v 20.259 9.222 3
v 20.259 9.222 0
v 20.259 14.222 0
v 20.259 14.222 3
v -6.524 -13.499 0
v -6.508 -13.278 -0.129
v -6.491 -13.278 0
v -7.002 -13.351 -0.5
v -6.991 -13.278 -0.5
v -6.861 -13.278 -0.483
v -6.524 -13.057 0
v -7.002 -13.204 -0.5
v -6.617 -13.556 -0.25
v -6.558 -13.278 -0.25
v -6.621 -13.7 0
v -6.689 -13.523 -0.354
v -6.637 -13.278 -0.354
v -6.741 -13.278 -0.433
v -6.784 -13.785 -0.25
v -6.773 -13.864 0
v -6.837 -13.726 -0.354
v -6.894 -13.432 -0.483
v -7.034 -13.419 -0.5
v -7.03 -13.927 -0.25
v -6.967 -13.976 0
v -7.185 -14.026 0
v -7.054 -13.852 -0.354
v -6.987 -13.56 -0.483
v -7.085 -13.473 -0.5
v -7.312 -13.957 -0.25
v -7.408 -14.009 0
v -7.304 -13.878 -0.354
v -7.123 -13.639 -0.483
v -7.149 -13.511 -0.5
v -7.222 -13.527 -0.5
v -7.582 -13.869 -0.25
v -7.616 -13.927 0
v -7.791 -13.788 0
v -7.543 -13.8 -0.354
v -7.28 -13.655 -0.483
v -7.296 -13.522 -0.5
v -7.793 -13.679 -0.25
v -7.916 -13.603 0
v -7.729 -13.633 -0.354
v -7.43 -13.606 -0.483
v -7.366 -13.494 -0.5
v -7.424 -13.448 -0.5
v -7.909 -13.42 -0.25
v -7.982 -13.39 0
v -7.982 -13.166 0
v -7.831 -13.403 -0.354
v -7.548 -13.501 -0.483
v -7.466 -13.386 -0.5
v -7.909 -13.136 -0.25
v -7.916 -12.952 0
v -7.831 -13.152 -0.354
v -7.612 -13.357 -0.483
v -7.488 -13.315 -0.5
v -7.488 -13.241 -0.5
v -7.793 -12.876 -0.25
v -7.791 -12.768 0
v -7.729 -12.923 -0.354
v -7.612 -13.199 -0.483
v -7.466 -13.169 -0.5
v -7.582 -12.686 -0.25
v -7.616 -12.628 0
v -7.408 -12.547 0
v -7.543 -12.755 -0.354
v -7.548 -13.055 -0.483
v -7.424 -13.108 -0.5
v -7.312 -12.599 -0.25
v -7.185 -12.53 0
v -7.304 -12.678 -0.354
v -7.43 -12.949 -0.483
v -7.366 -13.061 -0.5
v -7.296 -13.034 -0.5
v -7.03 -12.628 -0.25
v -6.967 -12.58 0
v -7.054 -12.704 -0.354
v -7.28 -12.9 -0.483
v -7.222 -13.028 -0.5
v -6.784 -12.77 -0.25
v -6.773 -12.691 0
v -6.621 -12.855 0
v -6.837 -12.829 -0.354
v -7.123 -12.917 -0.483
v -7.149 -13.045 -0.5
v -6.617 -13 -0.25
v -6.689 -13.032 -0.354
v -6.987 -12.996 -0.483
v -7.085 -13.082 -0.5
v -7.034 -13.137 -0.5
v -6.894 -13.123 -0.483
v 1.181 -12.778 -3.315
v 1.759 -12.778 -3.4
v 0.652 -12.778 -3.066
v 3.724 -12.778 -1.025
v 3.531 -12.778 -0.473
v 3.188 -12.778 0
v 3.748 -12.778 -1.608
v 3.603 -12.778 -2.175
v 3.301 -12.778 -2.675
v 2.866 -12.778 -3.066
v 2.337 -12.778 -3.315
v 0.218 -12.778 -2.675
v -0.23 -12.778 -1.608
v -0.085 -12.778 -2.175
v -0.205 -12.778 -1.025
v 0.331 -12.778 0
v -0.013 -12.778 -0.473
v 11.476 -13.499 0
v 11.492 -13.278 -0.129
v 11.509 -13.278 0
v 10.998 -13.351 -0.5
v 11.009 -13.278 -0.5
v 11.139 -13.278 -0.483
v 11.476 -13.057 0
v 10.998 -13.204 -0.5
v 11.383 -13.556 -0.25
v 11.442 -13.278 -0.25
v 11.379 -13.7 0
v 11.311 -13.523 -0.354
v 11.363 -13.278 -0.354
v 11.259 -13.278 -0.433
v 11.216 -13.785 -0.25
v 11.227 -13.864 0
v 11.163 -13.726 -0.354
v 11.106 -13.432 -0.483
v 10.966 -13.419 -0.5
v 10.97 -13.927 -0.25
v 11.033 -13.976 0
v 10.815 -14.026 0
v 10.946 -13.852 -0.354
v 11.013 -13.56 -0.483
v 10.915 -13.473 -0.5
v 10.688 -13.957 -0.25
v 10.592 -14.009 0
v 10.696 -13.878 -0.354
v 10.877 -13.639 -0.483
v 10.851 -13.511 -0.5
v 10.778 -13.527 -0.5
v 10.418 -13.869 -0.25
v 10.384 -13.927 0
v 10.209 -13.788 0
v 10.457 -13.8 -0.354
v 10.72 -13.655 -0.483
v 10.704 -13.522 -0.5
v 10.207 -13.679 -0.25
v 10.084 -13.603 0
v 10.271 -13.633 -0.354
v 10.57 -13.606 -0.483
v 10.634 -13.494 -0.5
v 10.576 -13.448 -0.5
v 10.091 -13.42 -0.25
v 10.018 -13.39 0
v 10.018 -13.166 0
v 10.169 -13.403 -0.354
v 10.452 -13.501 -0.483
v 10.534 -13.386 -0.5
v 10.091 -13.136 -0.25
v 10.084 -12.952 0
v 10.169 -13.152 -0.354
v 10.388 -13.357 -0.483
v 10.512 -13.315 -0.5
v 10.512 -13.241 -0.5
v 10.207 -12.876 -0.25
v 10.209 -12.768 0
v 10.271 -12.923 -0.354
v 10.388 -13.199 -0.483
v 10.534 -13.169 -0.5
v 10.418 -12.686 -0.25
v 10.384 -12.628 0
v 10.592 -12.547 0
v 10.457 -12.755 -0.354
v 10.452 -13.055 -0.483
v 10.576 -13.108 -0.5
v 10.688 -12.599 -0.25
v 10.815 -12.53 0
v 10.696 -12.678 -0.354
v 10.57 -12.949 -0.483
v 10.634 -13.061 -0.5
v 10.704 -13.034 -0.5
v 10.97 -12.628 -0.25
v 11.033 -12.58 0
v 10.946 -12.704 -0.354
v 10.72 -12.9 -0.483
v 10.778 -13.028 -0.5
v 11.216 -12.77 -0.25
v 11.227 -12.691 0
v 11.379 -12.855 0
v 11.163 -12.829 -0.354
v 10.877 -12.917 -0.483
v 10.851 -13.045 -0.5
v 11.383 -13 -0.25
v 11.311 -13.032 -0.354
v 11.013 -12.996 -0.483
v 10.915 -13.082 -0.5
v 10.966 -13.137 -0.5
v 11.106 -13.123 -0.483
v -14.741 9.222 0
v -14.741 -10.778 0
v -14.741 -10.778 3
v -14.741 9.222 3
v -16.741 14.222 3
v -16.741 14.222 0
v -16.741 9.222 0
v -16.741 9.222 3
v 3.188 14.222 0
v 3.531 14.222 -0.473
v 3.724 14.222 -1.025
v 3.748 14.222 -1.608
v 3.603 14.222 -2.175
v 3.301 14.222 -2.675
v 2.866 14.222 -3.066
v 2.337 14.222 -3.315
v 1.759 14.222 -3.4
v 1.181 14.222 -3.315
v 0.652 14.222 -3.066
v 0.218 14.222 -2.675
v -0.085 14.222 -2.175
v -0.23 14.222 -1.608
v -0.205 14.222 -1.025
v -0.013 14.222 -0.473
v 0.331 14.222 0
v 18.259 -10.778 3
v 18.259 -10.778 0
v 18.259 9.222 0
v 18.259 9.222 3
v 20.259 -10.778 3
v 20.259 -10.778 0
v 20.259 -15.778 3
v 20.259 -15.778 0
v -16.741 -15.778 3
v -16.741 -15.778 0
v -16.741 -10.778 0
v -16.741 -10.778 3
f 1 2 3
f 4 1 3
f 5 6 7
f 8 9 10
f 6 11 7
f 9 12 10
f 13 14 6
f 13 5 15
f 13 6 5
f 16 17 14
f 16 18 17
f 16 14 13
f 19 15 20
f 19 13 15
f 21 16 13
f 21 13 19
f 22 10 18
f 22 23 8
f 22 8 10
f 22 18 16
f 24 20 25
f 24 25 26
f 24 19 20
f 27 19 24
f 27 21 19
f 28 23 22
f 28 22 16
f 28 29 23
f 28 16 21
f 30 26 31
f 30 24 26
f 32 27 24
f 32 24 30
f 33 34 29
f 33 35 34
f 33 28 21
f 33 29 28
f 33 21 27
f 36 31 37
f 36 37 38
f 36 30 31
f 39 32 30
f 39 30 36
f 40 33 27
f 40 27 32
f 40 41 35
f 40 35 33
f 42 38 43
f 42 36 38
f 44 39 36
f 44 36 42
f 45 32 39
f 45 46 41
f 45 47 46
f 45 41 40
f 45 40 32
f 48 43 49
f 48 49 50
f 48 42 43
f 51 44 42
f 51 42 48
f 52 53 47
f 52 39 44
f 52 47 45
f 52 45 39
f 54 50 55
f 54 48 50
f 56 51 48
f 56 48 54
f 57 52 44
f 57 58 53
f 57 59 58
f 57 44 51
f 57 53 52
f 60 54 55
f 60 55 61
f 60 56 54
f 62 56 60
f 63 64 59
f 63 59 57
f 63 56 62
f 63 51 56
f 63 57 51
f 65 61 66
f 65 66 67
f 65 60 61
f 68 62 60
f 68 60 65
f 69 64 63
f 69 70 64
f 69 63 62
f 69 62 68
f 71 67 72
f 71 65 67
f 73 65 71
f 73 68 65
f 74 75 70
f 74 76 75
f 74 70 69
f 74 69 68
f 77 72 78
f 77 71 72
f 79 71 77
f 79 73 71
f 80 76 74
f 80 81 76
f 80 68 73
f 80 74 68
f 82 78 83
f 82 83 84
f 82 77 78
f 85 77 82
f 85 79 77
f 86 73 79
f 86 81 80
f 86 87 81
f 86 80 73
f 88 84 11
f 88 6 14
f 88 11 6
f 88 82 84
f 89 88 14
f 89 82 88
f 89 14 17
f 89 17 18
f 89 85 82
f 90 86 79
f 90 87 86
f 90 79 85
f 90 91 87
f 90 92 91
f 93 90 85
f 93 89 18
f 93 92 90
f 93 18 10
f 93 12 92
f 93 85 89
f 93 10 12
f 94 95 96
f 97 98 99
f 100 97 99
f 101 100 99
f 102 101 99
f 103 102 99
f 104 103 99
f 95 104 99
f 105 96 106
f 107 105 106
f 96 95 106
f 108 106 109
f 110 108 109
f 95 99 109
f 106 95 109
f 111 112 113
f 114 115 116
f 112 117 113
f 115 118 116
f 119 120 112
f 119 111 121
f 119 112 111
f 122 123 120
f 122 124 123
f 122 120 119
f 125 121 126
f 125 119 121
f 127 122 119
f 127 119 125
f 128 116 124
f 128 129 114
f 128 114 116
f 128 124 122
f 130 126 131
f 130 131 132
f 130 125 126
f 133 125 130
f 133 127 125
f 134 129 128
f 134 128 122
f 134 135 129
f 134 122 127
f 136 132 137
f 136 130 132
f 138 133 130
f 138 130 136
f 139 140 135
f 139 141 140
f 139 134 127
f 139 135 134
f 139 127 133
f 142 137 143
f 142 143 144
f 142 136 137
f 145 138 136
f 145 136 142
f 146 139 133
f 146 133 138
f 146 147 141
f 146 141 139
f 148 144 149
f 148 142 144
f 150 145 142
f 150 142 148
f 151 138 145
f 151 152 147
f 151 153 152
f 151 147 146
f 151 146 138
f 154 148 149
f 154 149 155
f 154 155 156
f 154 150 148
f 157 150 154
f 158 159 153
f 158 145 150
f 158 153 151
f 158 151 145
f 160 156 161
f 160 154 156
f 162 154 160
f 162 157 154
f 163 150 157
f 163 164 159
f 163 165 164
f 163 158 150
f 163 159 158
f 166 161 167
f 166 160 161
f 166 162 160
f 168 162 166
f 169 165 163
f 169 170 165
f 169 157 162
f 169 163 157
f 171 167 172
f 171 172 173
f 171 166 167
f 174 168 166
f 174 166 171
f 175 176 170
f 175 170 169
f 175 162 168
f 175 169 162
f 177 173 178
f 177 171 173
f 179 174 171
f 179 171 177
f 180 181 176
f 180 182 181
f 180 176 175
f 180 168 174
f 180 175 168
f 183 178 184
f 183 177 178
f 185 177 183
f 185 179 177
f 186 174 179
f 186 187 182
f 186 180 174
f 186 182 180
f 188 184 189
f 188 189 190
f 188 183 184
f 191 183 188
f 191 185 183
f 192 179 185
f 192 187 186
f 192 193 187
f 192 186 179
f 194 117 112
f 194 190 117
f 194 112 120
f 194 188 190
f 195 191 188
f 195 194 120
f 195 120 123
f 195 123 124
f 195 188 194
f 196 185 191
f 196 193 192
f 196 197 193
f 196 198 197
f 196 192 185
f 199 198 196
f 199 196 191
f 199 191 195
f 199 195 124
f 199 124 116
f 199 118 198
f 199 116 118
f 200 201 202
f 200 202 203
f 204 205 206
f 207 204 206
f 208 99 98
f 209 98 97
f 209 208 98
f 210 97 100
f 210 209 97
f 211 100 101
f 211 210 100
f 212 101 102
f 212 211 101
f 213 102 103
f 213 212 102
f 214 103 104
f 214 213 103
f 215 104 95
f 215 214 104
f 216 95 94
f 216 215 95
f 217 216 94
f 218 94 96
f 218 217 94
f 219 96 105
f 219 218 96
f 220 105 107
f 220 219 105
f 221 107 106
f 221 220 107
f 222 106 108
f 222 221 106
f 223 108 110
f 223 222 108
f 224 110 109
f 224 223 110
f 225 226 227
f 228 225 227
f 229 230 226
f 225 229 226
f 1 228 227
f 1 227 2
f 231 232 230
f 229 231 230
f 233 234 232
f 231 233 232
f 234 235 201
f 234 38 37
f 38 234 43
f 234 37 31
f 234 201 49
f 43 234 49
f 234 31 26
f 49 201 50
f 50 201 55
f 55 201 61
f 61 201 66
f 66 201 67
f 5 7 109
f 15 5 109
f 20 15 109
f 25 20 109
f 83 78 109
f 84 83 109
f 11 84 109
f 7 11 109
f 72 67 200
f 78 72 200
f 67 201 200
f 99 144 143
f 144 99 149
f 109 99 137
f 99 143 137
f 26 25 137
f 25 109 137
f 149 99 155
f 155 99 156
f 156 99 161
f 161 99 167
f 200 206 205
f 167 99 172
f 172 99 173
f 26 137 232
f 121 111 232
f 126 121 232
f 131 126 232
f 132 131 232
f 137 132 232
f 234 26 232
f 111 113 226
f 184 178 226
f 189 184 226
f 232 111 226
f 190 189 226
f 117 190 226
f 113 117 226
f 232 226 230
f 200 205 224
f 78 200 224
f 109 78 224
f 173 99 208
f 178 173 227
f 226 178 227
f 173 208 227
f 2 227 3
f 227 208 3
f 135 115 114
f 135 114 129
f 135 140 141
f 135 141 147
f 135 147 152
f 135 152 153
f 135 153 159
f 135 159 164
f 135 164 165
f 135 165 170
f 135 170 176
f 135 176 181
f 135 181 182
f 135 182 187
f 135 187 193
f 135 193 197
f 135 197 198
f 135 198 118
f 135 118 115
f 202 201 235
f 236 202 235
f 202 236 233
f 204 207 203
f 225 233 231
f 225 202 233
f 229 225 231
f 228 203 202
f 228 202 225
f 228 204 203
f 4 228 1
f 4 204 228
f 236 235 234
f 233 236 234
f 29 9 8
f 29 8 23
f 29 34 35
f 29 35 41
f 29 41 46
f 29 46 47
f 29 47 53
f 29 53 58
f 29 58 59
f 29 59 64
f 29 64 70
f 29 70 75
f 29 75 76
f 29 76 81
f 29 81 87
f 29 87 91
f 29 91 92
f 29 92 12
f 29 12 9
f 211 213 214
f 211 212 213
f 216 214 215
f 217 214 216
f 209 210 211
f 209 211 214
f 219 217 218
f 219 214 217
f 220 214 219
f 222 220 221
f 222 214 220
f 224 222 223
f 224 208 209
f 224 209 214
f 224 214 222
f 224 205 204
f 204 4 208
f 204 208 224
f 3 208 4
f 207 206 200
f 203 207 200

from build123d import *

# Parameters (mm, degrees)
F0_W     = 2
F0_H     = 1.5
F0_H_2   = 20
F0_W_2   = 11
F0_W_3   = 7
F1_DEPTH = 3
F3_DEPTH = 26.5
F5_R     = 2
F6_DEPTH = 27
F7_R     = 0.75
F8_DEPTH = 0.5
F9_R     = 0.49999


# Not quite as in the source:
# - a fillet or chamfer is up to 0.001 mm smaller than in the source, because OpenCascade refuses the exact size


with BuildPart() as f1:
    # F0 (on Top) → F1 (new body)
    with BuildSketch(Plane.XY):
        Polygon((-1.7407407407, 9.2222222222), (5.2592592593, 9.2222222222), (16.2592592593, 9.2222222222), (16.2592592593, 10.7222222222), (18.2592592593, 10.7222222222), (18.2592592593, 9.2222222222), (20.2592592593, 9.2222222222), (20.2592592593, 14.2222222222), (-16.7407407407, 14.2222222222), (-16.7407407407, 9.2222222222), (-14.7407407407, 9.2222222222), (-14.7407407407, 10.7222222222), (-12.7407407407, 10.7222222222), (-12.7407407407, 9.2222222222), align=None)
        Polygon((16.2592592593, -10.7777777778), (5.2592592593, -10.7777777778), (-1.7407407407, -10.7777777778), (-12.7407407407, -10.7777777778), (-12.7407407407, -12.2777777778), (-14.7407407407, -12.2777777778), (-14.7407407407, -10.7777777778), (-16.7407407407, -10.7777777778), (-16.7407407407, -15.7777777778), (20.2592592593, -15.7777777778), (20.2592592593, -10.7777777778), (18.2592592593, -10.7777777778), (18.2592592593, -12.2777777778), (16.2592592593, -12.2777777778), align=None)
        with Locations((17.2592592593, 9.9722222222)):
            Rectangle(F0_W, F0_H)
        with Locations((17.2592592593, -0.7777777778)):
            Rectangle(F0_W, F0_H_2)
        with Locations((-13.7407407407, -0.7777777778)):
            Rectangle(F0_W, F0_H_2)
        with Locations((-13.7407407407, 9.9722222222)):
            Rectangle(F0_W, F0_H)
        with Locations((17.2592592593, -11.5277777778)):
            Rectangle(F0_W, F0_H)
        with Locations((-13.7407407407, -11.5277777778)):
            Rectangle(F0_W, F0_H)
        with Locations((-7.2407407407, -0.7777777778)):
            Rectangle(F0_W_2, F0_H_2)
        with Locations((1.7592592593, -0.7777777778)):
            Rectangle(F0_W_3, F0_H_2)
        with Locations((10.7592592593, -0.7777777778)):
            Rectangle(F0_W_2, F0_H_2)
    extrude(amount=F1_DEPTH)

    # F5 (on face) → F6 (join)
    with BuildSketch(Plane(origin=(0, 14.2222222222, 0), x_dir=(-1, 0, 0), z_dir=(0, 1, 0))):
        with Locations((-1.7592592593, -1.4)):
            Circle(F5_R)
    extrude(amount=-F6_DEPTH)

    # F7 (on face) → F8 (join)
    with BuildSketch(Plane(origin=(0, 0, 0), x_dir=(1, 0, 0), z_dir=(0, 0, -1))):
        with Locations((-7.2407407407, 13.2777777778)):
            Circle(F7_R)
        with Locations((10.7592592593, 13.2777777778)):
            Circle(F7_R)
    extrude(amount=F8_DEPTH)

    # F9 (radius 0.5 in the source; OpenCascade refuses exactly that, so slightly less here)
    f9_edges = [f1.edges().sort_by_distance(p)[0] for p in [
        (10.009259, -13.277778, -0.5),
        (-7.990741, -13.277778, -0.5),
    ]]
    fillet(f9_edges, radius=F9_R)


with BuildPart() as f3:
    # F2 (on face) → F3 (new body)
    with BuildSketch(Plane(origin=(0, 14.2222222222, 0), x_dir=(-1, 0, 0), z_dir=(0, 1, 0))):
        with BuildLine():
            ThreePointArc((-1.3930631716, 0), (-0.7580650487, -3.223722123), (1.975, -1.4))
            ThreePointArc((1.975, -1.4), (1.823722123, -0.6419349513), (1.3930631716, 0))
            Line((1.3930631716, 0), (-1.3930631716, 0))
        make_face()
    extrude(amount=-F3_DEPTH)


solid = f1.part
